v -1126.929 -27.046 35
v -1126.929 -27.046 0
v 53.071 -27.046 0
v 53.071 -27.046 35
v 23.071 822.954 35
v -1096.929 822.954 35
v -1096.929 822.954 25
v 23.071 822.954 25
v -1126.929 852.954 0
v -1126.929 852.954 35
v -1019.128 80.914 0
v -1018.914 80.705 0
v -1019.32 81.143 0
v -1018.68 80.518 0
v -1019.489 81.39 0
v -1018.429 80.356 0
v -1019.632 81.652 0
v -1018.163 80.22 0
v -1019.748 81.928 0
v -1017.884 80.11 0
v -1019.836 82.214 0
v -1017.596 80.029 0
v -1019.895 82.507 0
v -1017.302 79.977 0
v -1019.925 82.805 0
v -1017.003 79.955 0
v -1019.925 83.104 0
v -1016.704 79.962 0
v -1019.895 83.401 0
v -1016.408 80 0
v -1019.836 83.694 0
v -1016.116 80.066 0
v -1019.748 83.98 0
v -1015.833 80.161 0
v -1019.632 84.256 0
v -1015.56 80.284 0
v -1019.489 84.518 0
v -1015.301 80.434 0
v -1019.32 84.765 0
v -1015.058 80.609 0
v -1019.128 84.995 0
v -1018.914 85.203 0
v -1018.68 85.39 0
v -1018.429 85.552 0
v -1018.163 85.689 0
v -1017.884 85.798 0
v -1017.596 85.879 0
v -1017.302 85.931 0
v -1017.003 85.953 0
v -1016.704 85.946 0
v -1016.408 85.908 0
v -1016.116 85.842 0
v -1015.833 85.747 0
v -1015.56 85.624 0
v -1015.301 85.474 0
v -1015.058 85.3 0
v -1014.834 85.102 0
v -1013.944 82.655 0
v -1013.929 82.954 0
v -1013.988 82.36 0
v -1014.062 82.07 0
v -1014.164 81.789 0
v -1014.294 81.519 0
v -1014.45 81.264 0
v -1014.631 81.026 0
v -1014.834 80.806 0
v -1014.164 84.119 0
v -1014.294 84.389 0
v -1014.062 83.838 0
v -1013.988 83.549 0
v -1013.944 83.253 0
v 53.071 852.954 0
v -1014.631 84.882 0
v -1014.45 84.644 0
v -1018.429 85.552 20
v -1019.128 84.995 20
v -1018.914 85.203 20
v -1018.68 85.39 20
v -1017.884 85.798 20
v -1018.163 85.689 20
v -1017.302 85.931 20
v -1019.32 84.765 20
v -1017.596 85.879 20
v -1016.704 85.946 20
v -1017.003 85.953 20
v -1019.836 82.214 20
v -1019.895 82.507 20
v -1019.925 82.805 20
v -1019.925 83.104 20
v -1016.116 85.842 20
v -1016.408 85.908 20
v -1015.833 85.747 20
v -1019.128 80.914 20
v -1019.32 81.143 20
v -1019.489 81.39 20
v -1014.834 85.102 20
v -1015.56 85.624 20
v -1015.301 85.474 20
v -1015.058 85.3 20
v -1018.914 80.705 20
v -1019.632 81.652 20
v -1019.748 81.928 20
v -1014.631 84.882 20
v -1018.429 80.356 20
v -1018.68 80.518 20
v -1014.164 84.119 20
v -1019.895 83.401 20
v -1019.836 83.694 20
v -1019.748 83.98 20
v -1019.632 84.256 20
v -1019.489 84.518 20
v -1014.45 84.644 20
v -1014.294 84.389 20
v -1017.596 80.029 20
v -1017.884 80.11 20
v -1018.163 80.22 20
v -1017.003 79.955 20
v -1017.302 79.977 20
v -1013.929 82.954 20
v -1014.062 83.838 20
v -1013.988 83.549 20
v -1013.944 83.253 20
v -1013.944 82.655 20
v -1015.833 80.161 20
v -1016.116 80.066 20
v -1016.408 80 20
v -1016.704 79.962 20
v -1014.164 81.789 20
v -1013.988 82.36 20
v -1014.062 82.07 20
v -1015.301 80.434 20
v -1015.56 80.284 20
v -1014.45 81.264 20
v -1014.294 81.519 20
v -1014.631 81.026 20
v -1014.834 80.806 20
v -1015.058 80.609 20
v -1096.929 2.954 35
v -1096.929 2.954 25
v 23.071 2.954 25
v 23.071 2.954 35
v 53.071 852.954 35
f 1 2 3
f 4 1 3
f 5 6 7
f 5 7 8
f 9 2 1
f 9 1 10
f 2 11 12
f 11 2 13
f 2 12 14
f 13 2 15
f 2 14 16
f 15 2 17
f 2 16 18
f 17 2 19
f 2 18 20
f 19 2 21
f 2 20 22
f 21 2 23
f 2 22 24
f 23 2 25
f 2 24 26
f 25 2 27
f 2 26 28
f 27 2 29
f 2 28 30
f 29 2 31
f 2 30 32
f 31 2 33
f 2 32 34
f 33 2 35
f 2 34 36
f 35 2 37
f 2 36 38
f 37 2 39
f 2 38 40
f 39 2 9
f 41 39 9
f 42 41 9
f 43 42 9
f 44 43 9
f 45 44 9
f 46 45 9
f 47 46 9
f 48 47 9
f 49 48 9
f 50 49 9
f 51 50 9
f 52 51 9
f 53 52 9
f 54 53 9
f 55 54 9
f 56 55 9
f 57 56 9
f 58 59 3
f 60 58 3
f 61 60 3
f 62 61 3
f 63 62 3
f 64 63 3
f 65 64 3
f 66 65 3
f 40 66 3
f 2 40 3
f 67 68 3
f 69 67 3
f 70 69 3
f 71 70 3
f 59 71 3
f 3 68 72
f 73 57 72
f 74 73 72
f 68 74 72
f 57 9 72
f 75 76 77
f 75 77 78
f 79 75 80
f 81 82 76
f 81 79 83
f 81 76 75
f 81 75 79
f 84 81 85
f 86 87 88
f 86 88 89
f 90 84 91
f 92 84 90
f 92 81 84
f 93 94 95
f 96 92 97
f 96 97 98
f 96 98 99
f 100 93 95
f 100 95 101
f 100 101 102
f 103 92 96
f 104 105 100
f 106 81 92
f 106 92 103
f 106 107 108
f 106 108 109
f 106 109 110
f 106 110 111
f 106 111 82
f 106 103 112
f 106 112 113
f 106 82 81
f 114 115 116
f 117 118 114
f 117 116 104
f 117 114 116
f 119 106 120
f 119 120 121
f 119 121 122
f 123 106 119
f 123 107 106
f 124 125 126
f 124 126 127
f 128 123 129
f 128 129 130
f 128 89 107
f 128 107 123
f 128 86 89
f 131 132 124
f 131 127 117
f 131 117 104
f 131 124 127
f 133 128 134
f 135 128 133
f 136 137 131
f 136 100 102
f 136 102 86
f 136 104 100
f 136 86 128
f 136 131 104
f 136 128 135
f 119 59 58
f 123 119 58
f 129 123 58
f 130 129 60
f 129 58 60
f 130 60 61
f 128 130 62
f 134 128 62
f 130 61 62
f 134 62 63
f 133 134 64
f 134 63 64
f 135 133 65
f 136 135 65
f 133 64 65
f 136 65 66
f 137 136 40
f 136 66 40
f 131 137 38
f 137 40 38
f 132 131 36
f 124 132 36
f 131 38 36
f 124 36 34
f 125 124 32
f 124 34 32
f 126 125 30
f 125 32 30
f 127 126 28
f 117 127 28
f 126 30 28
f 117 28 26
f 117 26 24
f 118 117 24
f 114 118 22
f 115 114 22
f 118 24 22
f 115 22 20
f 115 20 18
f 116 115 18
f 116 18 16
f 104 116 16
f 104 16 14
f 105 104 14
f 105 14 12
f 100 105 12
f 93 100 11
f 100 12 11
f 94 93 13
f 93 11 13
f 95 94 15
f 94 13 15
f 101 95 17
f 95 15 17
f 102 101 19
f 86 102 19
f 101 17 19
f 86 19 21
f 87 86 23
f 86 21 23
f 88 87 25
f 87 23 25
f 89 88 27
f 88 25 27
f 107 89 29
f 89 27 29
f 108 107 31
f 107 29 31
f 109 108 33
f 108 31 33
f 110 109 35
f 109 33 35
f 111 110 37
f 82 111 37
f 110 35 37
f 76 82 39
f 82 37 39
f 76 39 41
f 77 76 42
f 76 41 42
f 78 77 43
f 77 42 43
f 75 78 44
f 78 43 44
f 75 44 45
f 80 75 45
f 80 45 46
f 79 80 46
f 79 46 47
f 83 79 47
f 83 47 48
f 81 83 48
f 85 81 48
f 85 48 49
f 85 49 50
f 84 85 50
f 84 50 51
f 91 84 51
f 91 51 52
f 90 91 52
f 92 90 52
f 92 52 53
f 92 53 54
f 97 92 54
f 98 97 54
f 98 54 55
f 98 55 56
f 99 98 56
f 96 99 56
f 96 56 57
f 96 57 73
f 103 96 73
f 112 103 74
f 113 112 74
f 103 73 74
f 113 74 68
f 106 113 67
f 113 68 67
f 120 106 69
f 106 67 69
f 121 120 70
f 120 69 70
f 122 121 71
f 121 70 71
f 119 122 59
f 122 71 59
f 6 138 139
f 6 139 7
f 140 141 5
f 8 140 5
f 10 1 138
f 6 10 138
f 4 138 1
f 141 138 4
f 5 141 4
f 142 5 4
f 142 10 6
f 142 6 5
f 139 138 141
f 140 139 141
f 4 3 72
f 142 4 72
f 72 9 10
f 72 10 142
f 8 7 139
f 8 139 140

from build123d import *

# Parameters (mm, degrees)
F0_W     = 1180
F0_H     = 880
F1_DEPTH = 35
F2_R     = 3
F3_DEPTH = 20
F5_W     = 1120
F5_H     = 820
F6_DEPTH = 10


with BuildPart() as f1:
    # F0 (on Top) → F1 (new body)
    with BuildSketch(Plane.XY):
        with Locations((-536.928684, 412.954066)):
            Rectangle(F0_W, F0_H)
    extrude(amount=F1_DEPTH)

    # F2 (on face) → F3 (cut)
    with BuildSketch(Plane(origin=(0, 0, 0), x_dir=(1, 0, 0), z_dir=(0, 0, -1))):
        with Locations((-1016.928684, -82.954066)):
            Circle(F2_R)
    extrude(amount=-F3_DEPTH, mode=Mode.SUBTRACT)

    # F5 (on face) → F6 (cut)
    with BuildSketch(Plane.XY.offset(35)):
        with Locations((-536.928684, 412.954066)):
            Rectangle(F5_W, F5_H)
    extrude(amount=-F6_DEPTH, mode=Mode.SUBTRACT)


solid = f1.part
